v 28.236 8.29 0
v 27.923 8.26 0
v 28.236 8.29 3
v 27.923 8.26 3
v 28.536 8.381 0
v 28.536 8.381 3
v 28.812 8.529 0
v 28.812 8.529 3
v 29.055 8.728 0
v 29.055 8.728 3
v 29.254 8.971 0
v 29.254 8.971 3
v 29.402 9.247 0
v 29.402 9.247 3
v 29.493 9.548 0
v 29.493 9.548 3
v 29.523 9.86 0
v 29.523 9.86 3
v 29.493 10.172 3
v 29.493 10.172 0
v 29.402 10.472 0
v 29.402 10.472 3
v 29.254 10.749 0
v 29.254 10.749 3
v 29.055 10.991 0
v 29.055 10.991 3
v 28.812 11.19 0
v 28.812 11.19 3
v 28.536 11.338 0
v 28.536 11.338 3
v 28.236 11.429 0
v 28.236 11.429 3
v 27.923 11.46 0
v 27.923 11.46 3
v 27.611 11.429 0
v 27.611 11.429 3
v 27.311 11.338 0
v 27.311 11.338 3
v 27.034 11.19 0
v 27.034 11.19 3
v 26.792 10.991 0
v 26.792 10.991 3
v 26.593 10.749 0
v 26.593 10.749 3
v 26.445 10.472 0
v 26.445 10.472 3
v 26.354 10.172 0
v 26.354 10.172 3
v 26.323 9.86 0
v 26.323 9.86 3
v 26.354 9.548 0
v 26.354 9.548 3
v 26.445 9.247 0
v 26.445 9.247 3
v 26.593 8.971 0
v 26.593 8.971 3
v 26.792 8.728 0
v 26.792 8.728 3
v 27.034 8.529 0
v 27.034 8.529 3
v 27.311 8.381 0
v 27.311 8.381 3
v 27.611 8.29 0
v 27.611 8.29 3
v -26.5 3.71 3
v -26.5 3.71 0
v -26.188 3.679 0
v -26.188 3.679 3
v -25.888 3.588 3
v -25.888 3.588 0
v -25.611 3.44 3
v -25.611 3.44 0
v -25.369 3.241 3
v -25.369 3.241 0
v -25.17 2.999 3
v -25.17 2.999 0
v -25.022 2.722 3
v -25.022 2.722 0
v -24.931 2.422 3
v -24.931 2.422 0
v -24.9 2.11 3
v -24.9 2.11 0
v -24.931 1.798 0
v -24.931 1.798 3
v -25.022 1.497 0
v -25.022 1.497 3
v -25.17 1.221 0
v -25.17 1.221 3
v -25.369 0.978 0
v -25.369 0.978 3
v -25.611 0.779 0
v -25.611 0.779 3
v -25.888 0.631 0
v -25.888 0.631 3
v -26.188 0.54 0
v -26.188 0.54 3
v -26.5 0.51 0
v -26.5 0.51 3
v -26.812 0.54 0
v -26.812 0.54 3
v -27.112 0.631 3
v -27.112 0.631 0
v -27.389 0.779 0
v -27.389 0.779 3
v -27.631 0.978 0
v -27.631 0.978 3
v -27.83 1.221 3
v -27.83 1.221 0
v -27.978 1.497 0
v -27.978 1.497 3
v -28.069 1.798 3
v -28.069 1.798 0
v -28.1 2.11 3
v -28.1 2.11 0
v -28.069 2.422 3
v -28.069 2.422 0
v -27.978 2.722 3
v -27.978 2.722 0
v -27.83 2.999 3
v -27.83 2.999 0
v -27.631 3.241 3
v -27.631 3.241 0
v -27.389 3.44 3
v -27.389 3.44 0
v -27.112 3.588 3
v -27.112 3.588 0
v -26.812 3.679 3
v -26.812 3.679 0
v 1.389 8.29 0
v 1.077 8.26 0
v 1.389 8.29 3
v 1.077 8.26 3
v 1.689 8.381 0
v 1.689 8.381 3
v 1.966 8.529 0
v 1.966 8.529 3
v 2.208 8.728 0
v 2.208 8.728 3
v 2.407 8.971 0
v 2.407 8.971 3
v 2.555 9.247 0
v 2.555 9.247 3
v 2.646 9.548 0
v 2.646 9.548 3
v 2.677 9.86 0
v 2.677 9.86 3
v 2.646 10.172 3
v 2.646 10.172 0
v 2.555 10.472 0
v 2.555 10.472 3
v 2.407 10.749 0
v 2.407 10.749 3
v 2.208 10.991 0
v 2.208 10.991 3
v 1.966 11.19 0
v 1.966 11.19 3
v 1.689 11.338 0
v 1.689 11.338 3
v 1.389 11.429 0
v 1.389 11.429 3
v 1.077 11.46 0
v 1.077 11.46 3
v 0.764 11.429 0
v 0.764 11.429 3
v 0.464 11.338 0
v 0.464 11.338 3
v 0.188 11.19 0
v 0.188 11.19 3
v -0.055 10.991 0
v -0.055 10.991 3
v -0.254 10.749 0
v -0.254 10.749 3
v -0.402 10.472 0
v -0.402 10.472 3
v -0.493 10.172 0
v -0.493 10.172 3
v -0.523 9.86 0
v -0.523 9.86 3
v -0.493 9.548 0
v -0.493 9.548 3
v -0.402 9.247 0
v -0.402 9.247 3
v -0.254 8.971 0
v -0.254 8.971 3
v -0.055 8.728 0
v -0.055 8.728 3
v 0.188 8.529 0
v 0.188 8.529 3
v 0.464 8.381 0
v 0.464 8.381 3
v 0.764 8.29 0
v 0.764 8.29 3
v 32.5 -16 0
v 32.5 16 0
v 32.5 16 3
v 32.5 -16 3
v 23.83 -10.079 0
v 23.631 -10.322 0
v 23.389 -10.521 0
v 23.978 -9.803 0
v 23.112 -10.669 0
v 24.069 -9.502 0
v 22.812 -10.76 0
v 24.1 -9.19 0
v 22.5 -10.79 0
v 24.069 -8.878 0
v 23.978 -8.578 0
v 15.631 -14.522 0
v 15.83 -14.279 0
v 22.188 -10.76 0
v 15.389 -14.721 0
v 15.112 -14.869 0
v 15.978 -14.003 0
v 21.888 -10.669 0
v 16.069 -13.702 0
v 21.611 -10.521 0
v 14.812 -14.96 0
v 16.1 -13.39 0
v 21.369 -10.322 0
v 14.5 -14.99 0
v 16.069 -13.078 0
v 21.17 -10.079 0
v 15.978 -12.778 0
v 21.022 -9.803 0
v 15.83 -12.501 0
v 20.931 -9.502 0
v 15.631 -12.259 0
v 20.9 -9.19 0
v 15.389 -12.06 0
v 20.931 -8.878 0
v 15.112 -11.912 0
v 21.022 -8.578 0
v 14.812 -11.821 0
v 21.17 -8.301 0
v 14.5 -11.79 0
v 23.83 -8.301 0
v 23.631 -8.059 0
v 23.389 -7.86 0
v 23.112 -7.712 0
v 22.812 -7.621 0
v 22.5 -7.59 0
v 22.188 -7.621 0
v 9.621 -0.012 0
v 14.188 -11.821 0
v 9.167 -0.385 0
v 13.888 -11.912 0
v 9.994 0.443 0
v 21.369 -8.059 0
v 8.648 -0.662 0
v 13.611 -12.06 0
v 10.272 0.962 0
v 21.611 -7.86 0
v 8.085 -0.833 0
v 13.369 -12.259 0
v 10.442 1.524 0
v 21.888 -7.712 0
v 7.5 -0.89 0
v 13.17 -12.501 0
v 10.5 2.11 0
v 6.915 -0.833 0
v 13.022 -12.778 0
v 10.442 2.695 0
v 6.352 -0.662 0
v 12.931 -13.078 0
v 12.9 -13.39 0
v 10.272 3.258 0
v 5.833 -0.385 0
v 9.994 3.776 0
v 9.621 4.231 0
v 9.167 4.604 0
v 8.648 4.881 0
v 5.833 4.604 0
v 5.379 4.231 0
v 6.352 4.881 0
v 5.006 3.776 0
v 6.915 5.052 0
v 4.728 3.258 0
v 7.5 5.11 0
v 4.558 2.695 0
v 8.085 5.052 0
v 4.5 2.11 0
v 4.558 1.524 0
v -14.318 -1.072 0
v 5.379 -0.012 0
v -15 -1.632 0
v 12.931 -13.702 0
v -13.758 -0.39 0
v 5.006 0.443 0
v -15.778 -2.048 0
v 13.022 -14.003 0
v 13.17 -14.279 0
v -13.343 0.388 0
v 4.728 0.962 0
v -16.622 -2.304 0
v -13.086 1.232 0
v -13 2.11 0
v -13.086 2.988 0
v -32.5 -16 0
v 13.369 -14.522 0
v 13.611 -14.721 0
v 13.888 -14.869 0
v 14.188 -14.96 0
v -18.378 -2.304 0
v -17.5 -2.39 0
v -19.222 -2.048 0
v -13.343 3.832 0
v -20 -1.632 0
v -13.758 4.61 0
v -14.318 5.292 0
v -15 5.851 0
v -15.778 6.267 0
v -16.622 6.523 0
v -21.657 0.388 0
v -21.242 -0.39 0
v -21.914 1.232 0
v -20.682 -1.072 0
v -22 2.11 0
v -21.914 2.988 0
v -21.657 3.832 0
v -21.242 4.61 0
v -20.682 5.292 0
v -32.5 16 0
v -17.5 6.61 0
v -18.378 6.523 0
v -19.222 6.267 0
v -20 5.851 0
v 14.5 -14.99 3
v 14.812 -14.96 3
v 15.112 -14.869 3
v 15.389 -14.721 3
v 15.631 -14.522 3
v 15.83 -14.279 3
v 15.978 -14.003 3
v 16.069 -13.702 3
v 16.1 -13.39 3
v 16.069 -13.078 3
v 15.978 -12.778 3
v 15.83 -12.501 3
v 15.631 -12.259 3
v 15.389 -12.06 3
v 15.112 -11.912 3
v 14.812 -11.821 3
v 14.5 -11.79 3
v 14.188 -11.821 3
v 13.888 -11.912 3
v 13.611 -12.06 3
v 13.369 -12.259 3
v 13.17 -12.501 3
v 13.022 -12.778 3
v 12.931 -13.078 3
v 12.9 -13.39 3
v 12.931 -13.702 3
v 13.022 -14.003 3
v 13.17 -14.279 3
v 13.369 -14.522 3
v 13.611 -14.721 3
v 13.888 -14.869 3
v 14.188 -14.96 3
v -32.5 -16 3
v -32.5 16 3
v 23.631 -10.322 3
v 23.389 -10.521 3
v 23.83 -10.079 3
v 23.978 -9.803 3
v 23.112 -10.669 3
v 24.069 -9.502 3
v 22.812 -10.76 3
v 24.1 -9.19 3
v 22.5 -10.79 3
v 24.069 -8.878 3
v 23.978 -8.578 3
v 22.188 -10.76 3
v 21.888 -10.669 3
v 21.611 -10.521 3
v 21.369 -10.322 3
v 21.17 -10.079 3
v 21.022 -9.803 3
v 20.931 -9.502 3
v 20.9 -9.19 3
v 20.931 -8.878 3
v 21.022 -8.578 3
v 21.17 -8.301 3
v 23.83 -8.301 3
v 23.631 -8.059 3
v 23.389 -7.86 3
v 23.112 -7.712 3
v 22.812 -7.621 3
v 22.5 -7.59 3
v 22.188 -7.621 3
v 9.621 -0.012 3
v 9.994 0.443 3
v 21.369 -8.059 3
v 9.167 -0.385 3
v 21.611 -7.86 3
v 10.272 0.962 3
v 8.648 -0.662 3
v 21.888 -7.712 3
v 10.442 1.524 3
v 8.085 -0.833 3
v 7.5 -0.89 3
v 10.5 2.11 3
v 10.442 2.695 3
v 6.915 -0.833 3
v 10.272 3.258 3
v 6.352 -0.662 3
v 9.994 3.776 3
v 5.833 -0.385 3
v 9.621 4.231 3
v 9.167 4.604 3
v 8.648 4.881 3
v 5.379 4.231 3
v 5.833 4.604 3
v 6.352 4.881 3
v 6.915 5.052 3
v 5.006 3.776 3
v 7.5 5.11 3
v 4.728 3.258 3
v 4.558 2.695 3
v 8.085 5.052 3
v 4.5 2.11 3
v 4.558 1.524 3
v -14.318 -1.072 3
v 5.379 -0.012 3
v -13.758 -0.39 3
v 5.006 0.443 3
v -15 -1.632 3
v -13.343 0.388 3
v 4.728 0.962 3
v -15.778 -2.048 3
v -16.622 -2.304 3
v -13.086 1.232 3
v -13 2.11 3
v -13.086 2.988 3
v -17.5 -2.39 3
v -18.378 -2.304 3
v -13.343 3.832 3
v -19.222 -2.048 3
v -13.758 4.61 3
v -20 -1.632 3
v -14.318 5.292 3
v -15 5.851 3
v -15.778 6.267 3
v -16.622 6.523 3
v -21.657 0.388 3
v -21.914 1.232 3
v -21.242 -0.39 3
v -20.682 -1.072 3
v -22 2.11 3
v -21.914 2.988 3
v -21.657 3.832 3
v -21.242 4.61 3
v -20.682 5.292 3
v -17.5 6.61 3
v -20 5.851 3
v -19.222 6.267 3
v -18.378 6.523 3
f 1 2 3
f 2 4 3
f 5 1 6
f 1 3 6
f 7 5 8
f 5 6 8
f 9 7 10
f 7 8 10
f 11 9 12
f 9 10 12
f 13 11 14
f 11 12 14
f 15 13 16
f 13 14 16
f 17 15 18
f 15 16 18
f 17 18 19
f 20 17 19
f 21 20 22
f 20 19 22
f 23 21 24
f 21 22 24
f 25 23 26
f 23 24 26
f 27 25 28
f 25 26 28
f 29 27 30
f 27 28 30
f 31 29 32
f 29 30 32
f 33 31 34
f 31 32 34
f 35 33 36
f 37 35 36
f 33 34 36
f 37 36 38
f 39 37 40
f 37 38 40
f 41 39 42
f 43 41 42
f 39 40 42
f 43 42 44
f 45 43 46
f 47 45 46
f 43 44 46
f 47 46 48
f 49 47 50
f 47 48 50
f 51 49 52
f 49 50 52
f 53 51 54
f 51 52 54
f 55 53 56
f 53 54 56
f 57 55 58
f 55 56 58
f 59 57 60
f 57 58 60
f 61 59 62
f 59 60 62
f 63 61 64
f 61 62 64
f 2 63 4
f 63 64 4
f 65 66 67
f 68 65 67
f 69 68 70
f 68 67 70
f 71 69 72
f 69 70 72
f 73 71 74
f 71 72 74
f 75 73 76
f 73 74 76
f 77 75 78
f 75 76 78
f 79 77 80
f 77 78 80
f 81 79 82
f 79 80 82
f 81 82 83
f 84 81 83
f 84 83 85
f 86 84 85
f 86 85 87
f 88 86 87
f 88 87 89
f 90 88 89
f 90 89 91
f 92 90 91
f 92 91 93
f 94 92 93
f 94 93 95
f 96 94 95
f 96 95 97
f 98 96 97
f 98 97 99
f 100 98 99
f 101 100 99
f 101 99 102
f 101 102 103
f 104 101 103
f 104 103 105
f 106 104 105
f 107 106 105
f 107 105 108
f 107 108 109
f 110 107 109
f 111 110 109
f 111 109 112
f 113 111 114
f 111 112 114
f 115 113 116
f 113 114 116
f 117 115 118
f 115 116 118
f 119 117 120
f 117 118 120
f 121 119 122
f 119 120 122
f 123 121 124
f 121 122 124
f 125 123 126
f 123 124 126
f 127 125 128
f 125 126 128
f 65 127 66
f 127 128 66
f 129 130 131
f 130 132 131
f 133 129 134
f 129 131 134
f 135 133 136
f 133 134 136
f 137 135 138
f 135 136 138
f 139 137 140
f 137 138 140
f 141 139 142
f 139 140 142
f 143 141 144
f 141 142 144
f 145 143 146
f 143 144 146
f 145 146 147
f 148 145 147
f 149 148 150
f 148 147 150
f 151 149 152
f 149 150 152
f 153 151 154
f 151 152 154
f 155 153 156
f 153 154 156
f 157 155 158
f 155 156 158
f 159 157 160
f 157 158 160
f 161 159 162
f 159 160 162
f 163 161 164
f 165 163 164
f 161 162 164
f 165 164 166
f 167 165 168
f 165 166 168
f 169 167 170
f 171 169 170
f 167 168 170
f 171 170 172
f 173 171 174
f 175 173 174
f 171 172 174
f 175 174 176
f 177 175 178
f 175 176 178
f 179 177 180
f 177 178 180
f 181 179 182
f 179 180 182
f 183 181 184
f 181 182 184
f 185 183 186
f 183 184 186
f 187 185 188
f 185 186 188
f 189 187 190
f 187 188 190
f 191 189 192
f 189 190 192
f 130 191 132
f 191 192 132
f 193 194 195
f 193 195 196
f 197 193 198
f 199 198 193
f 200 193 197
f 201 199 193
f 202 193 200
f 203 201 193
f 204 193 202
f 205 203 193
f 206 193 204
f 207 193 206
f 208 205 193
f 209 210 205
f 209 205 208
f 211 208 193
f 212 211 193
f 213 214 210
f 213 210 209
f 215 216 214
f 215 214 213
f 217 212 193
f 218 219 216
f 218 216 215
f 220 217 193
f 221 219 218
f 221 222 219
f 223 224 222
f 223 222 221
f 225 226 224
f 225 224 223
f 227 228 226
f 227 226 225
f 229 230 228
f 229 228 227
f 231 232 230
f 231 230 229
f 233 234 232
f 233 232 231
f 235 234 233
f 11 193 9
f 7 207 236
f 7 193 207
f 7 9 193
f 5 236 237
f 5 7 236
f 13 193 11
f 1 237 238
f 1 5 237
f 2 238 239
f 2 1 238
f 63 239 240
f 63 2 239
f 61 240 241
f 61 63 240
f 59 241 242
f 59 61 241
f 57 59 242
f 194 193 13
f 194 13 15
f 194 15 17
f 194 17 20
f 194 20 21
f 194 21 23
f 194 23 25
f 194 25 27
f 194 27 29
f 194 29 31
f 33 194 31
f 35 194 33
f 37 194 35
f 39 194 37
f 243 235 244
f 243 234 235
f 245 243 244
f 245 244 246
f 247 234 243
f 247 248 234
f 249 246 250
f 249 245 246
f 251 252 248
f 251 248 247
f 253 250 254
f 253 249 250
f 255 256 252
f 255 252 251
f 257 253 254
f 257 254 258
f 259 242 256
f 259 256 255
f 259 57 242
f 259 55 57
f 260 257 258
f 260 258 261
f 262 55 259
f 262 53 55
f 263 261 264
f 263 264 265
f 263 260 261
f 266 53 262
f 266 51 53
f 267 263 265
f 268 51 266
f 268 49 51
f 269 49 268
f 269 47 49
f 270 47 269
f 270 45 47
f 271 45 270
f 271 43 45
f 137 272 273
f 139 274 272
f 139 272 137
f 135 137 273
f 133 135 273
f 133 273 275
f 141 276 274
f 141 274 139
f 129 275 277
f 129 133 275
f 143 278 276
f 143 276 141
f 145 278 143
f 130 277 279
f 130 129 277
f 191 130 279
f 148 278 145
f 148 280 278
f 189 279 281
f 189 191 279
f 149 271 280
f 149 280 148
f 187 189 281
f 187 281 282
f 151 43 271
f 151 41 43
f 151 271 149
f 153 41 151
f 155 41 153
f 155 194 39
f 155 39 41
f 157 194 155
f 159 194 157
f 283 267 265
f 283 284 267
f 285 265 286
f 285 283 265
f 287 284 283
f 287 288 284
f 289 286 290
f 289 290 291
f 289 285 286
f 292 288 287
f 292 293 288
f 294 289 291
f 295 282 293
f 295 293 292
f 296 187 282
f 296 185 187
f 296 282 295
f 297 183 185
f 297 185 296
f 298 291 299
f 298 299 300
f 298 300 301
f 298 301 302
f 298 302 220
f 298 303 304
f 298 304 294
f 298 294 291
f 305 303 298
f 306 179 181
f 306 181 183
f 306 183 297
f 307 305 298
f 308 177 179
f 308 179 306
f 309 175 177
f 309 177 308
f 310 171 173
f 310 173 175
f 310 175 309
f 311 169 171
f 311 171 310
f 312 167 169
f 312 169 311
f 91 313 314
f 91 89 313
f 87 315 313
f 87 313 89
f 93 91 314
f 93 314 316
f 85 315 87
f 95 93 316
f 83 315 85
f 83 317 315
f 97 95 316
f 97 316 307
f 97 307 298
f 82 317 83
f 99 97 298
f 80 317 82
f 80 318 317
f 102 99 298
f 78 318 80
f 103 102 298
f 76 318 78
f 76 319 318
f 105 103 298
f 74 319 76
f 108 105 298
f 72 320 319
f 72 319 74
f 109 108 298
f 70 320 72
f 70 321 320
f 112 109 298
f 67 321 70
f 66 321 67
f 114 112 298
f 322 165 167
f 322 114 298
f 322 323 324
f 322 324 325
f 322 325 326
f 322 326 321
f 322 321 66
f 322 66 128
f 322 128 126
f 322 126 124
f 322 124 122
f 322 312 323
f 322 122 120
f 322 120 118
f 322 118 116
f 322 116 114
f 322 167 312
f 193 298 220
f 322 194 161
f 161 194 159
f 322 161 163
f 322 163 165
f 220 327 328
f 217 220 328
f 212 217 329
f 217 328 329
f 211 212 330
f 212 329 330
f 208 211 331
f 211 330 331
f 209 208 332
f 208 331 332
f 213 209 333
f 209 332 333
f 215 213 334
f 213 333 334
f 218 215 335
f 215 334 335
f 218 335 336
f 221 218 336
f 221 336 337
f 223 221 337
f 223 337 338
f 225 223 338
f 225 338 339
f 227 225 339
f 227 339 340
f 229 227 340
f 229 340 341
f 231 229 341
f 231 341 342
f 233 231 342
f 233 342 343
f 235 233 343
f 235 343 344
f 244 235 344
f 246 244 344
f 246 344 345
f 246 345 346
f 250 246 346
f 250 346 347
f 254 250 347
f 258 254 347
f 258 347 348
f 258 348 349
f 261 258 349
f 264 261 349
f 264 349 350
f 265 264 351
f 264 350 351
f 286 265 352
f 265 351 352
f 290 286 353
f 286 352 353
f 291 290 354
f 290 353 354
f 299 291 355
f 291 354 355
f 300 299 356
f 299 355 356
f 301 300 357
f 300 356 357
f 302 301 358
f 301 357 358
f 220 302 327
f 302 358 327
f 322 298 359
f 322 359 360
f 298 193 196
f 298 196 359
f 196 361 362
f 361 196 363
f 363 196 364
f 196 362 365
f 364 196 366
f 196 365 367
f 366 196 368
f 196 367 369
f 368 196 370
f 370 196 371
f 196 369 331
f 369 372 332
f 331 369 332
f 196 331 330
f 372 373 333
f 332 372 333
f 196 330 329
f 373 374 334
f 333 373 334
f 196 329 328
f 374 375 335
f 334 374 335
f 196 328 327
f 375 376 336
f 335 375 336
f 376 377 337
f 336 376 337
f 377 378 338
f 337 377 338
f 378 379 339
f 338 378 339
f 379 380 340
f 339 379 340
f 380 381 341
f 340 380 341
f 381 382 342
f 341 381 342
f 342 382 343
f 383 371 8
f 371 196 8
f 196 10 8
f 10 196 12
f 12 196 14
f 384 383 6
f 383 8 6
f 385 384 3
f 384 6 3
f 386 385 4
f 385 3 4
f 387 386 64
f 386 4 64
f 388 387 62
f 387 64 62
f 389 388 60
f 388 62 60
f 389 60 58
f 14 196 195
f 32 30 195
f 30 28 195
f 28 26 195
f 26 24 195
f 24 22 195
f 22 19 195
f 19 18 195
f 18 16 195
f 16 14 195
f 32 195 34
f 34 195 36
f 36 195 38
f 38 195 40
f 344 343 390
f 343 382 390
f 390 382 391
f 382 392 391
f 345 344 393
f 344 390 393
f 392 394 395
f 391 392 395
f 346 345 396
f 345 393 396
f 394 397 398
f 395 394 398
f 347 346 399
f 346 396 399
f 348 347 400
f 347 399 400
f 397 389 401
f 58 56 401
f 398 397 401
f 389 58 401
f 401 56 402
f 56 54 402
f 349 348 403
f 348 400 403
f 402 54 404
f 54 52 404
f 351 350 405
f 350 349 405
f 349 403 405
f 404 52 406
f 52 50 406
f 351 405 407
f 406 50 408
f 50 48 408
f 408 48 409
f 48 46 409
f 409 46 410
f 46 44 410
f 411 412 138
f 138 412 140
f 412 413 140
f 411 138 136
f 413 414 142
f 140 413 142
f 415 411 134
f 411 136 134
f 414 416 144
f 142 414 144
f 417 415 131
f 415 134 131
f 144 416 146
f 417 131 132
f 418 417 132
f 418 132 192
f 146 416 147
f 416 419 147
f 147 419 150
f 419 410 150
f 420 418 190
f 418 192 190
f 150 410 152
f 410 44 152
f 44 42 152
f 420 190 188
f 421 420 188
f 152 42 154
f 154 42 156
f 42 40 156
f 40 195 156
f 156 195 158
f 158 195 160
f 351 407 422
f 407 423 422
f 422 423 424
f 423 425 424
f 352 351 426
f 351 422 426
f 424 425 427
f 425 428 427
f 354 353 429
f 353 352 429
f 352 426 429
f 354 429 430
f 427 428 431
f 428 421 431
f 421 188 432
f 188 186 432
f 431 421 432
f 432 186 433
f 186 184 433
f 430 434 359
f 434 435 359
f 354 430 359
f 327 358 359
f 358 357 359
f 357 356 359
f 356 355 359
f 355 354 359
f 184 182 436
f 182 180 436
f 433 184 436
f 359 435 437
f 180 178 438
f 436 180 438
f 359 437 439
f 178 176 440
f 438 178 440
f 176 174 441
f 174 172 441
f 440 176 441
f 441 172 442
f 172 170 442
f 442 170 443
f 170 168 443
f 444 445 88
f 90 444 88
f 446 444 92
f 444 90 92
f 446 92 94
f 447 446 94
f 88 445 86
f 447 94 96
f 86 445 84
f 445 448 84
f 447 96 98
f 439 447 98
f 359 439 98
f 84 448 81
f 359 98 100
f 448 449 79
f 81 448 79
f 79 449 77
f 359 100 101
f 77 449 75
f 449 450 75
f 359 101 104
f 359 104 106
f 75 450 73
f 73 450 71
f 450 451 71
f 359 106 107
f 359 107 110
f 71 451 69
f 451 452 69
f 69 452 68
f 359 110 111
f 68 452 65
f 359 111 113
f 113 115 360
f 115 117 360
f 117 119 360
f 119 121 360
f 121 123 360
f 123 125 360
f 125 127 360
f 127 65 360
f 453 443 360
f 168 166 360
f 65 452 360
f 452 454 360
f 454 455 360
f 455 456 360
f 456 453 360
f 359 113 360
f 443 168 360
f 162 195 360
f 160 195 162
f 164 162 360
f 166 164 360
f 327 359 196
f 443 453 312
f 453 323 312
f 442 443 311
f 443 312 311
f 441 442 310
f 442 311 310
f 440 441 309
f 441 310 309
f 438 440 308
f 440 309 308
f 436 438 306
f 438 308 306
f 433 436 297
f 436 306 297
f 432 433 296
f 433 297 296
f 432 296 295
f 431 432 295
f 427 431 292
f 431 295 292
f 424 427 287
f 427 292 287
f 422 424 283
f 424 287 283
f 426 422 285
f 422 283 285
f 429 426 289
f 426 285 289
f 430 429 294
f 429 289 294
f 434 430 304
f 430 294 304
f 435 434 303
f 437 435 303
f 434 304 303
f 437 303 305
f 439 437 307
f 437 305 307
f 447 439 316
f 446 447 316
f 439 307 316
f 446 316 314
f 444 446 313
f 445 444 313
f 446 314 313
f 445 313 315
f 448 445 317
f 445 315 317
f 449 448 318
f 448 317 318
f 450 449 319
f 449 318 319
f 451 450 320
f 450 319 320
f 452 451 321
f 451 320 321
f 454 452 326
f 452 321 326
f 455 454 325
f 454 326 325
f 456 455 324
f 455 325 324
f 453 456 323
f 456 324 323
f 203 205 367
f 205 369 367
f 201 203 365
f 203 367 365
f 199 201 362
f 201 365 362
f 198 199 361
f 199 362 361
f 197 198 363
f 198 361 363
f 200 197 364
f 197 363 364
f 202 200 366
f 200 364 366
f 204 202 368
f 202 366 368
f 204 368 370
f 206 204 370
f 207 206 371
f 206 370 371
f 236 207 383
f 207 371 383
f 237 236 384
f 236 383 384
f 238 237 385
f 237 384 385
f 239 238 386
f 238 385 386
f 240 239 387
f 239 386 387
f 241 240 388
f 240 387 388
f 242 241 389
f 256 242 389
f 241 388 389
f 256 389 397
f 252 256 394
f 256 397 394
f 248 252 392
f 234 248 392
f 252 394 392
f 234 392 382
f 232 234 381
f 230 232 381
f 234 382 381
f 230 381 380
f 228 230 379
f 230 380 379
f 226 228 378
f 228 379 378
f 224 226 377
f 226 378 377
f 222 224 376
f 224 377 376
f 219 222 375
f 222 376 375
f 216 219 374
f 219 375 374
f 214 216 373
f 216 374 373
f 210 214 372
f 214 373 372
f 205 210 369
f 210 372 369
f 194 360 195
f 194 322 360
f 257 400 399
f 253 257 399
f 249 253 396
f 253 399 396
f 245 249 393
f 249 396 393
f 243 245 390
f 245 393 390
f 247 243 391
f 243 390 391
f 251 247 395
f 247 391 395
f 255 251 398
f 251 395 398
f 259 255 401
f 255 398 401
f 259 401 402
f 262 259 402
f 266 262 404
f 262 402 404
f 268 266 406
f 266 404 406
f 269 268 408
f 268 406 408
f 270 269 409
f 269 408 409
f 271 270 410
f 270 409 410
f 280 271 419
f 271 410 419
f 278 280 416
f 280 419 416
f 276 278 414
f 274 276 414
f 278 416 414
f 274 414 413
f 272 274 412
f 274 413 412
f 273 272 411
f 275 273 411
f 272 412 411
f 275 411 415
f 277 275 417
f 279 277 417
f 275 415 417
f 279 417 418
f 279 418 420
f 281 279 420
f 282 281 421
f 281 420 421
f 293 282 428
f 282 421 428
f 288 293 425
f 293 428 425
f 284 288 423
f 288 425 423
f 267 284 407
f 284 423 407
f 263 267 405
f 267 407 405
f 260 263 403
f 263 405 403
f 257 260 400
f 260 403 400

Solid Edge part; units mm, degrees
sketch "Sketch1" plane through (0, 0, 0) normal (0, 0, 1) x (1, 0, 0)
  line L0 (32.5, -16) -> (-32.5, -16)
  line L1 (-32.5, -16) -> (-32.5, 16)
  line L2 (-32.5, 16) -> (32.5, 16)
  line L3 (32.5, 16) -> (32.5, -16)
  dimension "D1" = 32
  dimension "D2" = 65
extrude "Protrusion1" add sketch "Sketch1" along normal blind 3
hole "Hole_1" at (7.5, 2.1097, 3) direction (0, 0, -1) diameter 6 end through all
hole "Hole_2" at (14.5, -13.3903, 3) direction (0, 0, -1) diameter 3.2 end through all
hole "Hole1" at (1.0766, 9.8597, 3) direction (0, 0, -1) diameter 3.2 end through all
hole "Hole2" at (27.9234, 9.8597, 3) direction (0, 0, -1) diameter 3.2 end through all
hole "Hole3" at (22.5, -9.1903, 3) direction (0, 0, -1) diameter 3.2 end through all
hole "Hole_6" at (-17.5, 2.1097, 0) direction (0, 0, 1) diameter 9 end through all
hole "Hole_7" at (-26.5, 2.1097, 0) direction (0, 0, 1) diameter 3.2 end through all
